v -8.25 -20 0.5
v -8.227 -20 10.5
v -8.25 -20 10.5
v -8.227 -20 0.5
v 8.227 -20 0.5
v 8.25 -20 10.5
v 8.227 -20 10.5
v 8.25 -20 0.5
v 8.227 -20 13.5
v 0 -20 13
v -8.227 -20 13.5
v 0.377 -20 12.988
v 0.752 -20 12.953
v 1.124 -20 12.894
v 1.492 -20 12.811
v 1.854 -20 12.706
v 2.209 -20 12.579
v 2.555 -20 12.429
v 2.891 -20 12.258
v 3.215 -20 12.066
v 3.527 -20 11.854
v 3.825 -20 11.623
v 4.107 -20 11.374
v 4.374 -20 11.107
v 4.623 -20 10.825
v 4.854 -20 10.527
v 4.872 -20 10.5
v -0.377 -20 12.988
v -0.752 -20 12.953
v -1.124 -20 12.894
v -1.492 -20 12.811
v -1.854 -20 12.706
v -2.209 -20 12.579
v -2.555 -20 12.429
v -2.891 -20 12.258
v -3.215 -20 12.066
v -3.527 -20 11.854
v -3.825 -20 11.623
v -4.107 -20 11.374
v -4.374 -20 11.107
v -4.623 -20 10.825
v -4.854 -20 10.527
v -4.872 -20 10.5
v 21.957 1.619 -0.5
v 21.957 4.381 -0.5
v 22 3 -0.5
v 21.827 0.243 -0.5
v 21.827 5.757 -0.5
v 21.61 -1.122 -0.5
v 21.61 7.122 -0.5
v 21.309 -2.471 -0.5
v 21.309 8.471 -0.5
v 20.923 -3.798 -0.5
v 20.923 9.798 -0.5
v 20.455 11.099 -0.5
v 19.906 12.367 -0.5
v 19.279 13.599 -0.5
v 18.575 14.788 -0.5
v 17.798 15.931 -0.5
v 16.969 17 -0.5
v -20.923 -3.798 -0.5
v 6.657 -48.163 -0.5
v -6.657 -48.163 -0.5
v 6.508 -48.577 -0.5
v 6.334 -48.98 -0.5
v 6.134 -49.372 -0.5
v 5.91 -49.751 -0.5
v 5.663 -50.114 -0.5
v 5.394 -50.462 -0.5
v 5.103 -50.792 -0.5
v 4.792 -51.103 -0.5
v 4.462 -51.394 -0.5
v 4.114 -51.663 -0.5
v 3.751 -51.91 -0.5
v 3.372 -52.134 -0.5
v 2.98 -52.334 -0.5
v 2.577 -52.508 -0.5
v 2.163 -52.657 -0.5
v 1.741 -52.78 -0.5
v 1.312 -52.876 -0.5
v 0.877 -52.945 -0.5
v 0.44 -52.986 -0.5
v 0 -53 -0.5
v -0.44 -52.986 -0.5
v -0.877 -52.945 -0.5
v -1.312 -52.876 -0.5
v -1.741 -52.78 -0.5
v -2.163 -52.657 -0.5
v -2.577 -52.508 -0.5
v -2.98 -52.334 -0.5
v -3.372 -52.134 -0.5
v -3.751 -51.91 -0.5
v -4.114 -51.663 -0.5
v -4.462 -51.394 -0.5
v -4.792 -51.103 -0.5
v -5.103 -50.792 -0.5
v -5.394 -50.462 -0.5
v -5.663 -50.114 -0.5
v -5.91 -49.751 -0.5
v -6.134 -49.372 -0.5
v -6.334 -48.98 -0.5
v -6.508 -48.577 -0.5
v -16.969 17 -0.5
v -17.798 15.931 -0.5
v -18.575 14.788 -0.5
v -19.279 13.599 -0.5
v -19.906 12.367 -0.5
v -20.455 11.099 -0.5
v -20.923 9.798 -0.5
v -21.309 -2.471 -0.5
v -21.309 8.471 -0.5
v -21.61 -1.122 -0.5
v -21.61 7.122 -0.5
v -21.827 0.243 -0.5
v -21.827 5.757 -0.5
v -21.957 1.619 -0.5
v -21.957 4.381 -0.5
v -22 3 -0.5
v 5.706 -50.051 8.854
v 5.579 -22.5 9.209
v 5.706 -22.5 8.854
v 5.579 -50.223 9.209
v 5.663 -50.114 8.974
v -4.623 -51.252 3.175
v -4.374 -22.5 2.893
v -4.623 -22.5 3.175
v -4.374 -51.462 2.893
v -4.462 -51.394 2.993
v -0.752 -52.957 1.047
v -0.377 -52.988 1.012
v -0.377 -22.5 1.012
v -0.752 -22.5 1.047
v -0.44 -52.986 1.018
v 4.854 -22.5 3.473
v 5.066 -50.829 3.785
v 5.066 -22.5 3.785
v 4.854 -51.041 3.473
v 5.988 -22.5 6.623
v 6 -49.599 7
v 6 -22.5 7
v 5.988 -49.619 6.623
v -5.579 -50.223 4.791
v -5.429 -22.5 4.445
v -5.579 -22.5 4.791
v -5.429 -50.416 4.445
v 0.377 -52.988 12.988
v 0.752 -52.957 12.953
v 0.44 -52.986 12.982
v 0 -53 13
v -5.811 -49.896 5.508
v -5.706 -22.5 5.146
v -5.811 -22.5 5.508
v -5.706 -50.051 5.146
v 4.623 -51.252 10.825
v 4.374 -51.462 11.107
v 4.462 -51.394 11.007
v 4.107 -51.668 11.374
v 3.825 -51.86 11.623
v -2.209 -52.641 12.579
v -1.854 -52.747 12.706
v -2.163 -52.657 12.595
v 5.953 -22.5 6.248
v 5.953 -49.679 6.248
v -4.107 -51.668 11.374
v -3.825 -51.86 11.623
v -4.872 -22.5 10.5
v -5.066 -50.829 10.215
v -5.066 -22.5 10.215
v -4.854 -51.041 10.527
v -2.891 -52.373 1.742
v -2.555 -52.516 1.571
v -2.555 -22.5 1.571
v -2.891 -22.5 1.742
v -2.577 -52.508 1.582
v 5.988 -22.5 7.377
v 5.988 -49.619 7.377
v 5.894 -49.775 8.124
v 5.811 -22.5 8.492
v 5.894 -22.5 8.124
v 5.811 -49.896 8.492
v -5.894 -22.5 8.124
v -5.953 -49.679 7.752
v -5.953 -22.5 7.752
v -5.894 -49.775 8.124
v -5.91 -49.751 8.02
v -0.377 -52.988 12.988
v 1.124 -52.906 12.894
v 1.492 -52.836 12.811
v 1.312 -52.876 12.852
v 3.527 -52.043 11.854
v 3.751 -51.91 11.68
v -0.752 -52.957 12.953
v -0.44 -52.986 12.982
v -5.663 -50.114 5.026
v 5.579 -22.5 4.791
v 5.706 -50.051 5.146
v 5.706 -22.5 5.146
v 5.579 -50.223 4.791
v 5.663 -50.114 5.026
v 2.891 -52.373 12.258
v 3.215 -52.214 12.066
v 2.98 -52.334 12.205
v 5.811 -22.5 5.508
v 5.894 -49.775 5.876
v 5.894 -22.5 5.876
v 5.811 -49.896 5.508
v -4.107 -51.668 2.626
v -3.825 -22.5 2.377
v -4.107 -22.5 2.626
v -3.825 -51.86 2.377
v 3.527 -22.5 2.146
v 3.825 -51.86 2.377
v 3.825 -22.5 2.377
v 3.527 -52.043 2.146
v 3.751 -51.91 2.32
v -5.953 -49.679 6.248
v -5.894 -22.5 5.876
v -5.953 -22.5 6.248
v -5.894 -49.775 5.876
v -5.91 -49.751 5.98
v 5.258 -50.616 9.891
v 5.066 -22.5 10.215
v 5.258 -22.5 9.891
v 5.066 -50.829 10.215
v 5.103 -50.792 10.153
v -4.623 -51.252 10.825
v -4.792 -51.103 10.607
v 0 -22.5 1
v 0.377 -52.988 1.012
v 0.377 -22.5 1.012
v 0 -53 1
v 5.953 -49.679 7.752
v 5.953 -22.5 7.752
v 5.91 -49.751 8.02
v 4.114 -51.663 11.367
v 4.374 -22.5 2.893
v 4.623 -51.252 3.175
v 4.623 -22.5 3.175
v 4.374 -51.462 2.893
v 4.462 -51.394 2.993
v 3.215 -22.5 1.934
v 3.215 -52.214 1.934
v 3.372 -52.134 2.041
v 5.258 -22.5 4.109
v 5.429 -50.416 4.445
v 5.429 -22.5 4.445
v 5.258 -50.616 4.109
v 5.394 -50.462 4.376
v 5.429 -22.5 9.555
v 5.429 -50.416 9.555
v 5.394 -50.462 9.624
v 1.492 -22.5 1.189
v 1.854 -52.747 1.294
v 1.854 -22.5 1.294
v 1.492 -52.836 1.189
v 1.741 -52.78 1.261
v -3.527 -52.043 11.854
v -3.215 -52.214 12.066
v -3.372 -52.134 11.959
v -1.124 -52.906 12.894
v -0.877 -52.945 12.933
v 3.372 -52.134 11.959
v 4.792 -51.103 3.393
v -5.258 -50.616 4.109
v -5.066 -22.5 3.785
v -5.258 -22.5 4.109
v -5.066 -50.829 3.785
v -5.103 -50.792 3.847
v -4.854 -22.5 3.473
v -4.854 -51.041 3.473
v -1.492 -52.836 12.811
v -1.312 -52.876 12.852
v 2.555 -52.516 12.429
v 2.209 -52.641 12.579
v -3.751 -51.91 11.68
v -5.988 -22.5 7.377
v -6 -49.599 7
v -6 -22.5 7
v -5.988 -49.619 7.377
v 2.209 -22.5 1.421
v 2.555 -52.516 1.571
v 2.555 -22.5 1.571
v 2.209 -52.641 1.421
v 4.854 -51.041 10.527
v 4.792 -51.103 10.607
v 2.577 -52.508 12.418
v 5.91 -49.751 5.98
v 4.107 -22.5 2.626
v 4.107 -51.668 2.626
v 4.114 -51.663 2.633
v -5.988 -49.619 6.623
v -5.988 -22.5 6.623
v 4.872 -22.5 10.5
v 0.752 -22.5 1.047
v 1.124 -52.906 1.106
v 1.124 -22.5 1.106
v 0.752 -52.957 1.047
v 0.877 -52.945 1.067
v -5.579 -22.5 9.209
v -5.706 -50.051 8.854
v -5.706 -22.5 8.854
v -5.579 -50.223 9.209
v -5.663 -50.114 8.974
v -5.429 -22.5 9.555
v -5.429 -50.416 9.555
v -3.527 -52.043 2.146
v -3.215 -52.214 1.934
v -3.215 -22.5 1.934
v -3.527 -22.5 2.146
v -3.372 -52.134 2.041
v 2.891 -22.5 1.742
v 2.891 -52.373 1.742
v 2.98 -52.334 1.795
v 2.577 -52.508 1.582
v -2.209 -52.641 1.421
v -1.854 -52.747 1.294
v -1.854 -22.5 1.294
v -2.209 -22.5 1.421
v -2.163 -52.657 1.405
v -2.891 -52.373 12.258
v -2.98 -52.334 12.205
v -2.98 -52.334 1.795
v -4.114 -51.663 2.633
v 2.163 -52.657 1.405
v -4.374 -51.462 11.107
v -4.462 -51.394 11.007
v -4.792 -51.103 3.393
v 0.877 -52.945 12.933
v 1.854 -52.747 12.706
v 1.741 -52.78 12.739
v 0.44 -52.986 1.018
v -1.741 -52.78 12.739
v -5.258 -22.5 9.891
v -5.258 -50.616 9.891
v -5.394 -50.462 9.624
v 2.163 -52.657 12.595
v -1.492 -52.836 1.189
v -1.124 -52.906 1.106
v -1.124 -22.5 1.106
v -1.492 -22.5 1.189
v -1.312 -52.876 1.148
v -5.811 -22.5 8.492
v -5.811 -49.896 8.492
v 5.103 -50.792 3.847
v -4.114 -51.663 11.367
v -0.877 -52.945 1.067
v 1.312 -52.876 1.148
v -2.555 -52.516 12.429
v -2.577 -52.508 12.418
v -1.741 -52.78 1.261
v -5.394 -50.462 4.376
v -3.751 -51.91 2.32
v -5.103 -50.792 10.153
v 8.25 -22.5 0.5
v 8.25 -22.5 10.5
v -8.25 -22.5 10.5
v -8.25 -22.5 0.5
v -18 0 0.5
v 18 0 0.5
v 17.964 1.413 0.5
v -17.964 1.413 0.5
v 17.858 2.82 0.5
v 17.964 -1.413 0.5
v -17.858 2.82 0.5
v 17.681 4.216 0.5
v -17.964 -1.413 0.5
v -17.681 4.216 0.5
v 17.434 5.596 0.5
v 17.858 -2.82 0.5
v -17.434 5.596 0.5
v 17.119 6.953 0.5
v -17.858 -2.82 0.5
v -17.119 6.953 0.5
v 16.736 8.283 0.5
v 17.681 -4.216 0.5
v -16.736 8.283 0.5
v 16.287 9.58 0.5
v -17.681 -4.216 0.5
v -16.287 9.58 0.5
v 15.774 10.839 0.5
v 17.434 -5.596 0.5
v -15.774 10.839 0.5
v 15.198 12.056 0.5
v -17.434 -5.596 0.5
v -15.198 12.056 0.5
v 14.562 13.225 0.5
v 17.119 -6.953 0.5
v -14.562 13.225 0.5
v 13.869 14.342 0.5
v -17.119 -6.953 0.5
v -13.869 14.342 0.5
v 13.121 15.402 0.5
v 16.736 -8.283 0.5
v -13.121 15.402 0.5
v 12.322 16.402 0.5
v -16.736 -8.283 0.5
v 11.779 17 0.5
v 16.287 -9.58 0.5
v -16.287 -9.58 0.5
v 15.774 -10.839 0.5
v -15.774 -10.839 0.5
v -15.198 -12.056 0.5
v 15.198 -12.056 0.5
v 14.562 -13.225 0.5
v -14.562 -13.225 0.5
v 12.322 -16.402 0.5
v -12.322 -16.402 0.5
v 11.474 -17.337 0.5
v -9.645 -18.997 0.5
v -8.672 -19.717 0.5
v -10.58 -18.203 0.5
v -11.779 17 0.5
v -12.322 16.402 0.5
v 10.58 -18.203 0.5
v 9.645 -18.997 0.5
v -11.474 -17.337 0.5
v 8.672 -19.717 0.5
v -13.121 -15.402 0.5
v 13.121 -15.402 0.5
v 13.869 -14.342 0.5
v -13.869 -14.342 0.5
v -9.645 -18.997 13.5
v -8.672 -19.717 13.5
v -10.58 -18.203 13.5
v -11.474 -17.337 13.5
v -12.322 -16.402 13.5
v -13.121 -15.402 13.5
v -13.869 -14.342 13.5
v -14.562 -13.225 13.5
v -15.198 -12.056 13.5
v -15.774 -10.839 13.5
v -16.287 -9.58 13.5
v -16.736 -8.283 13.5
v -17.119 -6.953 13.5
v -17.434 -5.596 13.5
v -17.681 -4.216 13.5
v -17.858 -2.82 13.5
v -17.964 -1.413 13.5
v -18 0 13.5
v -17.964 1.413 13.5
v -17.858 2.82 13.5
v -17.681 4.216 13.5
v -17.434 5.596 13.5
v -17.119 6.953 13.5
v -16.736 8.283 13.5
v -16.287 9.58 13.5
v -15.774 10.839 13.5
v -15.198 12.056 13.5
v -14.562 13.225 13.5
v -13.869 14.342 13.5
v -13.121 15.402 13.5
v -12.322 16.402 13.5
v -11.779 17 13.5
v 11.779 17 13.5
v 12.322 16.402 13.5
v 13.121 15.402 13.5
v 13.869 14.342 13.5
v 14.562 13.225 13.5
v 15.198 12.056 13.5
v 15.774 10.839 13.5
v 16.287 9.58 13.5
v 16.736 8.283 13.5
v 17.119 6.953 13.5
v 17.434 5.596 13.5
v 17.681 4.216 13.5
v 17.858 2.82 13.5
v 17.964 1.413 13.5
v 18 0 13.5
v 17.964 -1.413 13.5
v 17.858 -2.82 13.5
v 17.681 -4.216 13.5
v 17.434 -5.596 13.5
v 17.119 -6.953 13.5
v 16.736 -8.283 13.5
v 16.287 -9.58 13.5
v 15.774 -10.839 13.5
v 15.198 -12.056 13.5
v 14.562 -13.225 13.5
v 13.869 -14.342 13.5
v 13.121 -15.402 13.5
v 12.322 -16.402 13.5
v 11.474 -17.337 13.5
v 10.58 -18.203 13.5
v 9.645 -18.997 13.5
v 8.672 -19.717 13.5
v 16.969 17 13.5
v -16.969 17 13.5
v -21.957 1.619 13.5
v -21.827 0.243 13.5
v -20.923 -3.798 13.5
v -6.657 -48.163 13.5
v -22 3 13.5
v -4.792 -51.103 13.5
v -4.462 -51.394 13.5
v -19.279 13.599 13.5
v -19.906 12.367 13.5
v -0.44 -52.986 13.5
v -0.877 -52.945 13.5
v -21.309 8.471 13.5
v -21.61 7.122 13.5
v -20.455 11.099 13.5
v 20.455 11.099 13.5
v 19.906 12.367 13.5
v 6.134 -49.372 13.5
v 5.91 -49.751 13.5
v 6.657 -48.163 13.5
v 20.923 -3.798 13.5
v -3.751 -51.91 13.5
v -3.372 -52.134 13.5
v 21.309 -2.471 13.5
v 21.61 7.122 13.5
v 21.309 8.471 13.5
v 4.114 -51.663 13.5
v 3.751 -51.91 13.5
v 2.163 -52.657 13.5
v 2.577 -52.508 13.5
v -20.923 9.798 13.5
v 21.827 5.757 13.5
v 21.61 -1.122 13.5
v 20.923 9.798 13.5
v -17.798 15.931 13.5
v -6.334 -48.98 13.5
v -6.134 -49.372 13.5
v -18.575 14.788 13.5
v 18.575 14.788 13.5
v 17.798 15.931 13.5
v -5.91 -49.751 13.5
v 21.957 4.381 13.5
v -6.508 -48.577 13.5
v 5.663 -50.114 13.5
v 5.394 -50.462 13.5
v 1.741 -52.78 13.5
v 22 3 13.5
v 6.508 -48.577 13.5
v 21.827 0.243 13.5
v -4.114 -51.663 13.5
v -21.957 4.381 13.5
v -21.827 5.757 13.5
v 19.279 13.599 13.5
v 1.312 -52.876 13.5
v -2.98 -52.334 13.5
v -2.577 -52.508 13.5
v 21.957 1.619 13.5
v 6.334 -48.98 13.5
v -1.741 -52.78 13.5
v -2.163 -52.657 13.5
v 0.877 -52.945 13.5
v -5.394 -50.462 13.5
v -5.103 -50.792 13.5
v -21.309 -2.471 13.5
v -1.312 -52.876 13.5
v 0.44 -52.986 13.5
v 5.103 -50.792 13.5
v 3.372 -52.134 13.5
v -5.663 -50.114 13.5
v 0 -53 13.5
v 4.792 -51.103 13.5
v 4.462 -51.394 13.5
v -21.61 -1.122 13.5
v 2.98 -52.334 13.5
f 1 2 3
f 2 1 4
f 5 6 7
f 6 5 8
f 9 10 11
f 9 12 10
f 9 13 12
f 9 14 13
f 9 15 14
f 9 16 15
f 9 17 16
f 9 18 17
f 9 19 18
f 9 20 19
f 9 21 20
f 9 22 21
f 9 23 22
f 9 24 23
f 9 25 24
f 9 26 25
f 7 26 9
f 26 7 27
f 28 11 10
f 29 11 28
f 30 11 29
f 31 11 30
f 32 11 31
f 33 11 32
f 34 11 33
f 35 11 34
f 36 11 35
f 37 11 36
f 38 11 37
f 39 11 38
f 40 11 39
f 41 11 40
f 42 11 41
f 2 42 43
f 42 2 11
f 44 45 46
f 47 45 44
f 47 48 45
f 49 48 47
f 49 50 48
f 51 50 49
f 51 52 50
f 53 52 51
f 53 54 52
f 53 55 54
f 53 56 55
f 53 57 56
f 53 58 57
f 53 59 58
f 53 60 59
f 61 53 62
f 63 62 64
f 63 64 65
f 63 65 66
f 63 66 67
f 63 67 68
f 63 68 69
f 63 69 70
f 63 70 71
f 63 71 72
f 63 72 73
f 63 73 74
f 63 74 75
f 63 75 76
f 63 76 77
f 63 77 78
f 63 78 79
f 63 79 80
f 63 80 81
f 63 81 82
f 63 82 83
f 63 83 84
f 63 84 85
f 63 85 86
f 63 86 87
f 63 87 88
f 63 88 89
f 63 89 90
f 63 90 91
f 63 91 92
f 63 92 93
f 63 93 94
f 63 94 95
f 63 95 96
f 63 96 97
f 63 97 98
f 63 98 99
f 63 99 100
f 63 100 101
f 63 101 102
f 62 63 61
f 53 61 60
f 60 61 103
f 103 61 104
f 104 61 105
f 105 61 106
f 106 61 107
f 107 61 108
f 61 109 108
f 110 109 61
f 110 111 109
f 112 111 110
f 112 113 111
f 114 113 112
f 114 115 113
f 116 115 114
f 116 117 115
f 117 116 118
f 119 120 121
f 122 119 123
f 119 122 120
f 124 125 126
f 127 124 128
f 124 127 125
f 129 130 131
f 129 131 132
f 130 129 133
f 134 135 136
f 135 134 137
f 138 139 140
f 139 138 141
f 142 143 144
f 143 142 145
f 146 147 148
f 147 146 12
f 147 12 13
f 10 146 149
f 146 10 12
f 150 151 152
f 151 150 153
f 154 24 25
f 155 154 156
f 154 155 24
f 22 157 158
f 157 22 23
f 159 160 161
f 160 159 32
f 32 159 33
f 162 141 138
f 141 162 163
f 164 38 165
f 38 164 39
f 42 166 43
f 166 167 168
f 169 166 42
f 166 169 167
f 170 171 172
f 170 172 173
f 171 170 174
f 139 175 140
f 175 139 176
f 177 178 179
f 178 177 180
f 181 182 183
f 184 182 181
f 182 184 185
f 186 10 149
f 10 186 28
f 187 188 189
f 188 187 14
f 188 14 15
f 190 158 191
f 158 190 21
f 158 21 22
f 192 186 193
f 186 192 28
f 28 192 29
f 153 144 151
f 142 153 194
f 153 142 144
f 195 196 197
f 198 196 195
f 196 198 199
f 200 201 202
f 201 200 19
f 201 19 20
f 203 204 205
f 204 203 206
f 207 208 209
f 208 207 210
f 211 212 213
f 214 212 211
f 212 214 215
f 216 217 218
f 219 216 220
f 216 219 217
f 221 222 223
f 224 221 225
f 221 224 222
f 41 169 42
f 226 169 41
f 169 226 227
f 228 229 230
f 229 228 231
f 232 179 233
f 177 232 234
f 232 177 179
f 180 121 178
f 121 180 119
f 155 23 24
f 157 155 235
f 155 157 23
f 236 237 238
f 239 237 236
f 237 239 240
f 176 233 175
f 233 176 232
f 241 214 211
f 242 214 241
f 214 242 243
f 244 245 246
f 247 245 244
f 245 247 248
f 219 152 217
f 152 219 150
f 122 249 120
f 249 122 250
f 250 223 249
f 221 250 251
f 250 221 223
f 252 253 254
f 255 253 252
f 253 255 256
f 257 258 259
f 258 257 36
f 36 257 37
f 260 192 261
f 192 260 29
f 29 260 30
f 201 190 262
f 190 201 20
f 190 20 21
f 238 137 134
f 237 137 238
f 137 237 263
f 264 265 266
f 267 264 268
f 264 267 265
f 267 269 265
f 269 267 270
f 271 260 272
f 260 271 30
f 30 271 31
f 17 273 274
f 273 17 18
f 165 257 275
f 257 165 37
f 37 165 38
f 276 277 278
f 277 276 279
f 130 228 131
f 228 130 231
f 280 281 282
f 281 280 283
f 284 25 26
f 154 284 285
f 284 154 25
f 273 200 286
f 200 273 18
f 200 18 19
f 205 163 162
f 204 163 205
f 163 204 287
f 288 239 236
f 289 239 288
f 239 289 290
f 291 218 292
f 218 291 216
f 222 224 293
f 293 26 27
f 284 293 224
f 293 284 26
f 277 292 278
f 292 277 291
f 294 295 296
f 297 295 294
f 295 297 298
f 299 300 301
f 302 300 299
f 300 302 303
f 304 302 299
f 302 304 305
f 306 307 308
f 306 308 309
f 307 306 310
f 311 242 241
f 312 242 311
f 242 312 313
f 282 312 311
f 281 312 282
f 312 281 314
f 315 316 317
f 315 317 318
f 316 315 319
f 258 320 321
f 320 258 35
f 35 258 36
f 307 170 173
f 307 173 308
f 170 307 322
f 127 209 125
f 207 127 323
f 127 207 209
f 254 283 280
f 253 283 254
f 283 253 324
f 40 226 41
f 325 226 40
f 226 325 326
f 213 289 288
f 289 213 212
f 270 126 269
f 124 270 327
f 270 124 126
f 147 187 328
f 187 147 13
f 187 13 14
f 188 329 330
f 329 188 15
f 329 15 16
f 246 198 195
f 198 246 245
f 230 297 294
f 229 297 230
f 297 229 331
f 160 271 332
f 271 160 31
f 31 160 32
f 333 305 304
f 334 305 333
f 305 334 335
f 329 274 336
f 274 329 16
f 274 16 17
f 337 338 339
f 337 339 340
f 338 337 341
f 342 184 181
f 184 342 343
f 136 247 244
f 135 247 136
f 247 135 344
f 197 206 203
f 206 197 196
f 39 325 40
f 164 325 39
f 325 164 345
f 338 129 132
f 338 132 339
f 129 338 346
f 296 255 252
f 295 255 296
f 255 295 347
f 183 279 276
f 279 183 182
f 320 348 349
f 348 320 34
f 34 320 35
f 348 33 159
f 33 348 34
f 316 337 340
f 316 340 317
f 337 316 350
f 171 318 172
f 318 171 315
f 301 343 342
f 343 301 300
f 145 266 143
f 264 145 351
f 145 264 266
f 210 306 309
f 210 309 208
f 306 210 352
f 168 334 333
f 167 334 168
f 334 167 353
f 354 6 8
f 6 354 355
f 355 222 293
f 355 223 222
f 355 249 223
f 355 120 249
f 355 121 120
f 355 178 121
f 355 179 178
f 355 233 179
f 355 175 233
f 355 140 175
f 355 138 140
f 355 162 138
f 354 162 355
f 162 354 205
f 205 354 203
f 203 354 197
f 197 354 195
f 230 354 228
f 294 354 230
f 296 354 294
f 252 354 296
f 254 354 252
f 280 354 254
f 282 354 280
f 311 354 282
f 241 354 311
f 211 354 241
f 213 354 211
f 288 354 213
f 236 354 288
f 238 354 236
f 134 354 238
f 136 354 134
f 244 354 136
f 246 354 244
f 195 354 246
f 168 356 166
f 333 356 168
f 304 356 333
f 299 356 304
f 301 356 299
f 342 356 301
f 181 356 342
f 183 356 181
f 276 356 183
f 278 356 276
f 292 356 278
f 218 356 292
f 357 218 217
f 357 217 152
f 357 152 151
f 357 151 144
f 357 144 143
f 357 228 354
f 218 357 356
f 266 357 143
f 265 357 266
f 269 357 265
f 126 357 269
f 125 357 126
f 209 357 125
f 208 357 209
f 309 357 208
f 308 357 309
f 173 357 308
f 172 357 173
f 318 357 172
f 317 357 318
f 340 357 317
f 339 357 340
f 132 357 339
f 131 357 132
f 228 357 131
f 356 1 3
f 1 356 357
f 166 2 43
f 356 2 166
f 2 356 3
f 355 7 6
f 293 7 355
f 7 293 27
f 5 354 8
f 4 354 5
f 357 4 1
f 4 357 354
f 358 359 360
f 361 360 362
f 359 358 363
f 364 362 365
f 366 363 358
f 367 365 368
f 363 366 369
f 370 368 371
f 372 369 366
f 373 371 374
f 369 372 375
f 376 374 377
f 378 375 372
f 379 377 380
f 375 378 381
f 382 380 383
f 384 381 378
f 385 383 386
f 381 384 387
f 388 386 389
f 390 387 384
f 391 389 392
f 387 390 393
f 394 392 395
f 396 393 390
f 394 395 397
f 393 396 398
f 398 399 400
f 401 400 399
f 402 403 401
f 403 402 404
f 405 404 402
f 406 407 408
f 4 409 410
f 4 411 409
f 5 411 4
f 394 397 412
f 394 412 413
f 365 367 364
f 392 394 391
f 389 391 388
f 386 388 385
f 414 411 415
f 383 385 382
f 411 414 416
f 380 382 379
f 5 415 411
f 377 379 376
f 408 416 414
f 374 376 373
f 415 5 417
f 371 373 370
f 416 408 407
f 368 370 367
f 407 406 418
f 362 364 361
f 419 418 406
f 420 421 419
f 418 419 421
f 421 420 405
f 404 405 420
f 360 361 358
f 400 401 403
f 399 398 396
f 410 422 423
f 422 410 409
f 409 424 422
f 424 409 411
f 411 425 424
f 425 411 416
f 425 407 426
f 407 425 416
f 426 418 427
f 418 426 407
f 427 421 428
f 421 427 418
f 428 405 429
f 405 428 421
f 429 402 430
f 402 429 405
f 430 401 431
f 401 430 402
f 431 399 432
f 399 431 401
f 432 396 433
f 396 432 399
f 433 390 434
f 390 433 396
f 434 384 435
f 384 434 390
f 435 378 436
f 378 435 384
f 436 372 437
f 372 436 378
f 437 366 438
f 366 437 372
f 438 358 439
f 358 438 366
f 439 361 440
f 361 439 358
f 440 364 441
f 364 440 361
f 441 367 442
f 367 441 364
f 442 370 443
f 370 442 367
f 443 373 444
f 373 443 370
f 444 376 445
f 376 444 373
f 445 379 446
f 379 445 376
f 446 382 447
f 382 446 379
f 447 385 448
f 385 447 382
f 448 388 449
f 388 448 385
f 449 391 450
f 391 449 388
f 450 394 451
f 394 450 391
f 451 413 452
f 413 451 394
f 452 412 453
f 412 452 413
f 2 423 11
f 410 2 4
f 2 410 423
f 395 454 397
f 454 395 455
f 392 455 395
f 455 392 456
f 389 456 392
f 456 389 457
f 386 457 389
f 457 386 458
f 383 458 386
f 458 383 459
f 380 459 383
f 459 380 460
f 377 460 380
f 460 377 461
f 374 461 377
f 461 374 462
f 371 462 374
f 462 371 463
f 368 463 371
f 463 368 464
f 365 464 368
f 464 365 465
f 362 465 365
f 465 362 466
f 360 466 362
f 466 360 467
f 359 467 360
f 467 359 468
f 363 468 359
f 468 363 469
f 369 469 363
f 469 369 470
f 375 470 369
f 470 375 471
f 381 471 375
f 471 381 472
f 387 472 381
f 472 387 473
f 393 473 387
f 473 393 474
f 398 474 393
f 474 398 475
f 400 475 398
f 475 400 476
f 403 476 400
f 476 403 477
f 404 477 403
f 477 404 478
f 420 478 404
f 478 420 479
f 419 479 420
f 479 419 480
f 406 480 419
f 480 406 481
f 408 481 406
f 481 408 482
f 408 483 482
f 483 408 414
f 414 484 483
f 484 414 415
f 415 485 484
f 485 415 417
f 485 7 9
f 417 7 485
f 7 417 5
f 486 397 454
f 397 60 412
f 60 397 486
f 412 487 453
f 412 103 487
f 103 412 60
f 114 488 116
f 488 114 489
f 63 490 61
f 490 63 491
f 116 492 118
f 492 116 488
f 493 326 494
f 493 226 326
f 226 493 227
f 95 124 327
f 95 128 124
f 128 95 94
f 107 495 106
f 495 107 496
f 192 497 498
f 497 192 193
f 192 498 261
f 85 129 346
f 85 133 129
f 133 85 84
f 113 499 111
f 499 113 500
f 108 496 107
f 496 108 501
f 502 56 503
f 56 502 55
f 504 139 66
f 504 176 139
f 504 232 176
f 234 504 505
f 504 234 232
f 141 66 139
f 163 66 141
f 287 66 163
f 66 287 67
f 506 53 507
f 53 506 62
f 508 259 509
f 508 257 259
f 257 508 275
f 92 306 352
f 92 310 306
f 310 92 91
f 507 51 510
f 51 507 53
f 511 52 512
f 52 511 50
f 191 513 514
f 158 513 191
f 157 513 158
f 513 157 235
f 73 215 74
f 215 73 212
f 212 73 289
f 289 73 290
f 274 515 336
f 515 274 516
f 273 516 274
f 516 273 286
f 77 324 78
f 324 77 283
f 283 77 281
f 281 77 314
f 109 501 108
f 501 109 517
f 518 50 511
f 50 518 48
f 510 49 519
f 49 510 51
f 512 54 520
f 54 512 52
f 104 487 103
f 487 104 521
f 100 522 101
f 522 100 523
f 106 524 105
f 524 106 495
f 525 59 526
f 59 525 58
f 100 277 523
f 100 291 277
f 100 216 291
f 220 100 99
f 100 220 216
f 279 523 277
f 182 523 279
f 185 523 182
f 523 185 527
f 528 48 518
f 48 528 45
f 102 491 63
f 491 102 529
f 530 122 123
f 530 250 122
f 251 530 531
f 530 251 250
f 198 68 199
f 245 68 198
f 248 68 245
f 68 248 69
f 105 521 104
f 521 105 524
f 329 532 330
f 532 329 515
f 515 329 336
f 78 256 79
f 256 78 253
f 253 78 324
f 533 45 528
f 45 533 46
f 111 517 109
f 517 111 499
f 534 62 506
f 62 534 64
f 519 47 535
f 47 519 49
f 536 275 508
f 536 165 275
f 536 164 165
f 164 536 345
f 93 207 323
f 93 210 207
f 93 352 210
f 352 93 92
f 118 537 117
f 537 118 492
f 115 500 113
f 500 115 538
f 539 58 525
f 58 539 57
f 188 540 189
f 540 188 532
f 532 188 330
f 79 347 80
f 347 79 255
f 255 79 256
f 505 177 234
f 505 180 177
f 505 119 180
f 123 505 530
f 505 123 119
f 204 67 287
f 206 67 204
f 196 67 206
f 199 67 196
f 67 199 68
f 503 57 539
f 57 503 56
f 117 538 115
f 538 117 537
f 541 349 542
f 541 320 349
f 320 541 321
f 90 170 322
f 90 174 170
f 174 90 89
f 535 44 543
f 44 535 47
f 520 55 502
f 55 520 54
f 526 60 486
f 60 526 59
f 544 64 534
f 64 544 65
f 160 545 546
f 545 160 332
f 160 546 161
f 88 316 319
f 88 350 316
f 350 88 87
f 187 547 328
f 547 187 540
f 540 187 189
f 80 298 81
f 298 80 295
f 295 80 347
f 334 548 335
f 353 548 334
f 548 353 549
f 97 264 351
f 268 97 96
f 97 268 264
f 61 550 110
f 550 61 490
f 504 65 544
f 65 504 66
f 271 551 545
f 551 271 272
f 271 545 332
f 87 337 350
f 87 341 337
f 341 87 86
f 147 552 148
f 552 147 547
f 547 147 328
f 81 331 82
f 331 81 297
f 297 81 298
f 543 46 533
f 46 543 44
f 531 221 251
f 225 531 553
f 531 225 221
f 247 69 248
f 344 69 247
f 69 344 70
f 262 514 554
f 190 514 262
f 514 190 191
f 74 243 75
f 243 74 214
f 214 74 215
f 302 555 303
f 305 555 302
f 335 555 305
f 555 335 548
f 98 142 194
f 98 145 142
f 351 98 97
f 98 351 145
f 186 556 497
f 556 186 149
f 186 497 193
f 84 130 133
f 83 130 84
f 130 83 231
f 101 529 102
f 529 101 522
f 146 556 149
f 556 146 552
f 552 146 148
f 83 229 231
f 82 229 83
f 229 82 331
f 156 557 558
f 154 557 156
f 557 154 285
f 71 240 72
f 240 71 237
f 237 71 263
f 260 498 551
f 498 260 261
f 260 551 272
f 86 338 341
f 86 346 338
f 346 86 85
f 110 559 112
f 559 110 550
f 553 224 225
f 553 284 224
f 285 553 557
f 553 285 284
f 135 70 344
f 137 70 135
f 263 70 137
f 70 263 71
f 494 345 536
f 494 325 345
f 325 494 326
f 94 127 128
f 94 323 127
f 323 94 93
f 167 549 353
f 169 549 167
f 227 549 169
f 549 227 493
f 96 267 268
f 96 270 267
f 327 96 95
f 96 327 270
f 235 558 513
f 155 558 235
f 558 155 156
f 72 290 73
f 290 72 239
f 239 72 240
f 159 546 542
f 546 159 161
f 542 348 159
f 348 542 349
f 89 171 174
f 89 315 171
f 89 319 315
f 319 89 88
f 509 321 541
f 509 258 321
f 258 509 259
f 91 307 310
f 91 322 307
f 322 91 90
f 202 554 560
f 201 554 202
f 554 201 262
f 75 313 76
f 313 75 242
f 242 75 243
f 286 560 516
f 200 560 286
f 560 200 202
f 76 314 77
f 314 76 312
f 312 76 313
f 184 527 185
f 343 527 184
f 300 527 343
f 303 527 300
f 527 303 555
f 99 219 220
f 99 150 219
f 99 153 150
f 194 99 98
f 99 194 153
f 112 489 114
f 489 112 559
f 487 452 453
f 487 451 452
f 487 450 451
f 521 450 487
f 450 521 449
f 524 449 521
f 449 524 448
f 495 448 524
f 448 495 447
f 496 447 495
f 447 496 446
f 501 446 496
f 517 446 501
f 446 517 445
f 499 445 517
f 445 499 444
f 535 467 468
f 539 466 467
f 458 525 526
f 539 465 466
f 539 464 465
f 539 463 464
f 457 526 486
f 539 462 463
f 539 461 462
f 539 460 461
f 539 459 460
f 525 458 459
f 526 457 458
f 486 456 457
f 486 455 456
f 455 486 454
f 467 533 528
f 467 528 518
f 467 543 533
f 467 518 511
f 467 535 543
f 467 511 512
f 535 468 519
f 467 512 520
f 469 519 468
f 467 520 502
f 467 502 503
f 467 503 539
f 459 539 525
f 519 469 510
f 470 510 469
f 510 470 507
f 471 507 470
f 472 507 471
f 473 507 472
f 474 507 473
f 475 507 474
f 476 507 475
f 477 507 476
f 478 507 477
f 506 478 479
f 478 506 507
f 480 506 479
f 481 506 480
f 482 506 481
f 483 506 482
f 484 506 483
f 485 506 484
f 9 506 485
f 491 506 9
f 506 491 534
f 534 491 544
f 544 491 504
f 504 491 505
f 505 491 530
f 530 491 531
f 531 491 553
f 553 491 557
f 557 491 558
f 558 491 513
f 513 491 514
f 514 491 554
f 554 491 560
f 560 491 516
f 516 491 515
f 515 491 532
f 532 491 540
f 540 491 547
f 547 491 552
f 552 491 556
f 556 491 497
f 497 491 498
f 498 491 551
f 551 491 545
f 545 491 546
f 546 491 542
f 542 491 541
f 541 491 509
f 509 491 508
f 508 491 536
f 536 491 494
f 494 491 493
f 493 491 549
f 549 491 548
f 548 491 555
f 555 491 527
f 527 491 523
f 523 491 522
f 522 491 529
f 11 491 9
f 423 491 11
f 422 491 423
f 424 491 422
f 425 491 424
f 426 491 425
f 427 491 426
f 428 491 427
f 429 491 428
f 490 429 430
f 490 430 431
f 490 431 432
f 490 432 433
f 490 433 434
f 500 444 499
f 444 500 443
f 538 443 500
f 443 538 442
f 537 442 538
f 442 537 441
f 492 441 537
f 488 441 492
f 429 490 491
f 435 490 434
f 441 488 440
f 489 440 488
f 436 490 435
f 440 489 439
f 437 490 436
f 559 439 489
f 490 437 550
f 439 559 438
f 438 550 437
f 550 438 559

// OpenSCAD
$fn = 100;
h = 14;

module part() {
  intersection() {
    difference() {
      union() {
        translate([0, 0, 0]) cube(size = [50, 40, 1], center = true);
        translate([0, 0, h / 2]) linear_extrude(height = h, center = true) {
          difference() {
            square(size = [50, 40], center = true);
            scale([1, 1.25]) circle(r=36/2);
          }
        }
        rotate([90, 0 ,0]) translate([0, 7, 20]) difference() {
          union() {
            translate([0, -0.25, 3.5]) cube(size = [40, h + 0.5, 7], center = true);
            translate([0, -0.25, 20]) cube(size = [30, h + 0.5, 40], center = true);
          }
          cylinder(h = 60, r = 6);
          translate([0, -1.5, 0]) cube(size = [16.5, 10, 5], center = true);
        }
      }
      translate([0, 22, h / 2]) cube(size = [40, 10, h + 2], center = true);
    }

    translate([0, 0, h / 2 - 1]) linear_extrude(height = h + 1, center = true) {
      hull() {
        translate([0, 3, 0]) circle(r = 22);
        translate([0, -15, 0]) circle(r = 10);
        translate([0, -46, 0]) circle(r = 7);
      }
    }
  }
}

part();
